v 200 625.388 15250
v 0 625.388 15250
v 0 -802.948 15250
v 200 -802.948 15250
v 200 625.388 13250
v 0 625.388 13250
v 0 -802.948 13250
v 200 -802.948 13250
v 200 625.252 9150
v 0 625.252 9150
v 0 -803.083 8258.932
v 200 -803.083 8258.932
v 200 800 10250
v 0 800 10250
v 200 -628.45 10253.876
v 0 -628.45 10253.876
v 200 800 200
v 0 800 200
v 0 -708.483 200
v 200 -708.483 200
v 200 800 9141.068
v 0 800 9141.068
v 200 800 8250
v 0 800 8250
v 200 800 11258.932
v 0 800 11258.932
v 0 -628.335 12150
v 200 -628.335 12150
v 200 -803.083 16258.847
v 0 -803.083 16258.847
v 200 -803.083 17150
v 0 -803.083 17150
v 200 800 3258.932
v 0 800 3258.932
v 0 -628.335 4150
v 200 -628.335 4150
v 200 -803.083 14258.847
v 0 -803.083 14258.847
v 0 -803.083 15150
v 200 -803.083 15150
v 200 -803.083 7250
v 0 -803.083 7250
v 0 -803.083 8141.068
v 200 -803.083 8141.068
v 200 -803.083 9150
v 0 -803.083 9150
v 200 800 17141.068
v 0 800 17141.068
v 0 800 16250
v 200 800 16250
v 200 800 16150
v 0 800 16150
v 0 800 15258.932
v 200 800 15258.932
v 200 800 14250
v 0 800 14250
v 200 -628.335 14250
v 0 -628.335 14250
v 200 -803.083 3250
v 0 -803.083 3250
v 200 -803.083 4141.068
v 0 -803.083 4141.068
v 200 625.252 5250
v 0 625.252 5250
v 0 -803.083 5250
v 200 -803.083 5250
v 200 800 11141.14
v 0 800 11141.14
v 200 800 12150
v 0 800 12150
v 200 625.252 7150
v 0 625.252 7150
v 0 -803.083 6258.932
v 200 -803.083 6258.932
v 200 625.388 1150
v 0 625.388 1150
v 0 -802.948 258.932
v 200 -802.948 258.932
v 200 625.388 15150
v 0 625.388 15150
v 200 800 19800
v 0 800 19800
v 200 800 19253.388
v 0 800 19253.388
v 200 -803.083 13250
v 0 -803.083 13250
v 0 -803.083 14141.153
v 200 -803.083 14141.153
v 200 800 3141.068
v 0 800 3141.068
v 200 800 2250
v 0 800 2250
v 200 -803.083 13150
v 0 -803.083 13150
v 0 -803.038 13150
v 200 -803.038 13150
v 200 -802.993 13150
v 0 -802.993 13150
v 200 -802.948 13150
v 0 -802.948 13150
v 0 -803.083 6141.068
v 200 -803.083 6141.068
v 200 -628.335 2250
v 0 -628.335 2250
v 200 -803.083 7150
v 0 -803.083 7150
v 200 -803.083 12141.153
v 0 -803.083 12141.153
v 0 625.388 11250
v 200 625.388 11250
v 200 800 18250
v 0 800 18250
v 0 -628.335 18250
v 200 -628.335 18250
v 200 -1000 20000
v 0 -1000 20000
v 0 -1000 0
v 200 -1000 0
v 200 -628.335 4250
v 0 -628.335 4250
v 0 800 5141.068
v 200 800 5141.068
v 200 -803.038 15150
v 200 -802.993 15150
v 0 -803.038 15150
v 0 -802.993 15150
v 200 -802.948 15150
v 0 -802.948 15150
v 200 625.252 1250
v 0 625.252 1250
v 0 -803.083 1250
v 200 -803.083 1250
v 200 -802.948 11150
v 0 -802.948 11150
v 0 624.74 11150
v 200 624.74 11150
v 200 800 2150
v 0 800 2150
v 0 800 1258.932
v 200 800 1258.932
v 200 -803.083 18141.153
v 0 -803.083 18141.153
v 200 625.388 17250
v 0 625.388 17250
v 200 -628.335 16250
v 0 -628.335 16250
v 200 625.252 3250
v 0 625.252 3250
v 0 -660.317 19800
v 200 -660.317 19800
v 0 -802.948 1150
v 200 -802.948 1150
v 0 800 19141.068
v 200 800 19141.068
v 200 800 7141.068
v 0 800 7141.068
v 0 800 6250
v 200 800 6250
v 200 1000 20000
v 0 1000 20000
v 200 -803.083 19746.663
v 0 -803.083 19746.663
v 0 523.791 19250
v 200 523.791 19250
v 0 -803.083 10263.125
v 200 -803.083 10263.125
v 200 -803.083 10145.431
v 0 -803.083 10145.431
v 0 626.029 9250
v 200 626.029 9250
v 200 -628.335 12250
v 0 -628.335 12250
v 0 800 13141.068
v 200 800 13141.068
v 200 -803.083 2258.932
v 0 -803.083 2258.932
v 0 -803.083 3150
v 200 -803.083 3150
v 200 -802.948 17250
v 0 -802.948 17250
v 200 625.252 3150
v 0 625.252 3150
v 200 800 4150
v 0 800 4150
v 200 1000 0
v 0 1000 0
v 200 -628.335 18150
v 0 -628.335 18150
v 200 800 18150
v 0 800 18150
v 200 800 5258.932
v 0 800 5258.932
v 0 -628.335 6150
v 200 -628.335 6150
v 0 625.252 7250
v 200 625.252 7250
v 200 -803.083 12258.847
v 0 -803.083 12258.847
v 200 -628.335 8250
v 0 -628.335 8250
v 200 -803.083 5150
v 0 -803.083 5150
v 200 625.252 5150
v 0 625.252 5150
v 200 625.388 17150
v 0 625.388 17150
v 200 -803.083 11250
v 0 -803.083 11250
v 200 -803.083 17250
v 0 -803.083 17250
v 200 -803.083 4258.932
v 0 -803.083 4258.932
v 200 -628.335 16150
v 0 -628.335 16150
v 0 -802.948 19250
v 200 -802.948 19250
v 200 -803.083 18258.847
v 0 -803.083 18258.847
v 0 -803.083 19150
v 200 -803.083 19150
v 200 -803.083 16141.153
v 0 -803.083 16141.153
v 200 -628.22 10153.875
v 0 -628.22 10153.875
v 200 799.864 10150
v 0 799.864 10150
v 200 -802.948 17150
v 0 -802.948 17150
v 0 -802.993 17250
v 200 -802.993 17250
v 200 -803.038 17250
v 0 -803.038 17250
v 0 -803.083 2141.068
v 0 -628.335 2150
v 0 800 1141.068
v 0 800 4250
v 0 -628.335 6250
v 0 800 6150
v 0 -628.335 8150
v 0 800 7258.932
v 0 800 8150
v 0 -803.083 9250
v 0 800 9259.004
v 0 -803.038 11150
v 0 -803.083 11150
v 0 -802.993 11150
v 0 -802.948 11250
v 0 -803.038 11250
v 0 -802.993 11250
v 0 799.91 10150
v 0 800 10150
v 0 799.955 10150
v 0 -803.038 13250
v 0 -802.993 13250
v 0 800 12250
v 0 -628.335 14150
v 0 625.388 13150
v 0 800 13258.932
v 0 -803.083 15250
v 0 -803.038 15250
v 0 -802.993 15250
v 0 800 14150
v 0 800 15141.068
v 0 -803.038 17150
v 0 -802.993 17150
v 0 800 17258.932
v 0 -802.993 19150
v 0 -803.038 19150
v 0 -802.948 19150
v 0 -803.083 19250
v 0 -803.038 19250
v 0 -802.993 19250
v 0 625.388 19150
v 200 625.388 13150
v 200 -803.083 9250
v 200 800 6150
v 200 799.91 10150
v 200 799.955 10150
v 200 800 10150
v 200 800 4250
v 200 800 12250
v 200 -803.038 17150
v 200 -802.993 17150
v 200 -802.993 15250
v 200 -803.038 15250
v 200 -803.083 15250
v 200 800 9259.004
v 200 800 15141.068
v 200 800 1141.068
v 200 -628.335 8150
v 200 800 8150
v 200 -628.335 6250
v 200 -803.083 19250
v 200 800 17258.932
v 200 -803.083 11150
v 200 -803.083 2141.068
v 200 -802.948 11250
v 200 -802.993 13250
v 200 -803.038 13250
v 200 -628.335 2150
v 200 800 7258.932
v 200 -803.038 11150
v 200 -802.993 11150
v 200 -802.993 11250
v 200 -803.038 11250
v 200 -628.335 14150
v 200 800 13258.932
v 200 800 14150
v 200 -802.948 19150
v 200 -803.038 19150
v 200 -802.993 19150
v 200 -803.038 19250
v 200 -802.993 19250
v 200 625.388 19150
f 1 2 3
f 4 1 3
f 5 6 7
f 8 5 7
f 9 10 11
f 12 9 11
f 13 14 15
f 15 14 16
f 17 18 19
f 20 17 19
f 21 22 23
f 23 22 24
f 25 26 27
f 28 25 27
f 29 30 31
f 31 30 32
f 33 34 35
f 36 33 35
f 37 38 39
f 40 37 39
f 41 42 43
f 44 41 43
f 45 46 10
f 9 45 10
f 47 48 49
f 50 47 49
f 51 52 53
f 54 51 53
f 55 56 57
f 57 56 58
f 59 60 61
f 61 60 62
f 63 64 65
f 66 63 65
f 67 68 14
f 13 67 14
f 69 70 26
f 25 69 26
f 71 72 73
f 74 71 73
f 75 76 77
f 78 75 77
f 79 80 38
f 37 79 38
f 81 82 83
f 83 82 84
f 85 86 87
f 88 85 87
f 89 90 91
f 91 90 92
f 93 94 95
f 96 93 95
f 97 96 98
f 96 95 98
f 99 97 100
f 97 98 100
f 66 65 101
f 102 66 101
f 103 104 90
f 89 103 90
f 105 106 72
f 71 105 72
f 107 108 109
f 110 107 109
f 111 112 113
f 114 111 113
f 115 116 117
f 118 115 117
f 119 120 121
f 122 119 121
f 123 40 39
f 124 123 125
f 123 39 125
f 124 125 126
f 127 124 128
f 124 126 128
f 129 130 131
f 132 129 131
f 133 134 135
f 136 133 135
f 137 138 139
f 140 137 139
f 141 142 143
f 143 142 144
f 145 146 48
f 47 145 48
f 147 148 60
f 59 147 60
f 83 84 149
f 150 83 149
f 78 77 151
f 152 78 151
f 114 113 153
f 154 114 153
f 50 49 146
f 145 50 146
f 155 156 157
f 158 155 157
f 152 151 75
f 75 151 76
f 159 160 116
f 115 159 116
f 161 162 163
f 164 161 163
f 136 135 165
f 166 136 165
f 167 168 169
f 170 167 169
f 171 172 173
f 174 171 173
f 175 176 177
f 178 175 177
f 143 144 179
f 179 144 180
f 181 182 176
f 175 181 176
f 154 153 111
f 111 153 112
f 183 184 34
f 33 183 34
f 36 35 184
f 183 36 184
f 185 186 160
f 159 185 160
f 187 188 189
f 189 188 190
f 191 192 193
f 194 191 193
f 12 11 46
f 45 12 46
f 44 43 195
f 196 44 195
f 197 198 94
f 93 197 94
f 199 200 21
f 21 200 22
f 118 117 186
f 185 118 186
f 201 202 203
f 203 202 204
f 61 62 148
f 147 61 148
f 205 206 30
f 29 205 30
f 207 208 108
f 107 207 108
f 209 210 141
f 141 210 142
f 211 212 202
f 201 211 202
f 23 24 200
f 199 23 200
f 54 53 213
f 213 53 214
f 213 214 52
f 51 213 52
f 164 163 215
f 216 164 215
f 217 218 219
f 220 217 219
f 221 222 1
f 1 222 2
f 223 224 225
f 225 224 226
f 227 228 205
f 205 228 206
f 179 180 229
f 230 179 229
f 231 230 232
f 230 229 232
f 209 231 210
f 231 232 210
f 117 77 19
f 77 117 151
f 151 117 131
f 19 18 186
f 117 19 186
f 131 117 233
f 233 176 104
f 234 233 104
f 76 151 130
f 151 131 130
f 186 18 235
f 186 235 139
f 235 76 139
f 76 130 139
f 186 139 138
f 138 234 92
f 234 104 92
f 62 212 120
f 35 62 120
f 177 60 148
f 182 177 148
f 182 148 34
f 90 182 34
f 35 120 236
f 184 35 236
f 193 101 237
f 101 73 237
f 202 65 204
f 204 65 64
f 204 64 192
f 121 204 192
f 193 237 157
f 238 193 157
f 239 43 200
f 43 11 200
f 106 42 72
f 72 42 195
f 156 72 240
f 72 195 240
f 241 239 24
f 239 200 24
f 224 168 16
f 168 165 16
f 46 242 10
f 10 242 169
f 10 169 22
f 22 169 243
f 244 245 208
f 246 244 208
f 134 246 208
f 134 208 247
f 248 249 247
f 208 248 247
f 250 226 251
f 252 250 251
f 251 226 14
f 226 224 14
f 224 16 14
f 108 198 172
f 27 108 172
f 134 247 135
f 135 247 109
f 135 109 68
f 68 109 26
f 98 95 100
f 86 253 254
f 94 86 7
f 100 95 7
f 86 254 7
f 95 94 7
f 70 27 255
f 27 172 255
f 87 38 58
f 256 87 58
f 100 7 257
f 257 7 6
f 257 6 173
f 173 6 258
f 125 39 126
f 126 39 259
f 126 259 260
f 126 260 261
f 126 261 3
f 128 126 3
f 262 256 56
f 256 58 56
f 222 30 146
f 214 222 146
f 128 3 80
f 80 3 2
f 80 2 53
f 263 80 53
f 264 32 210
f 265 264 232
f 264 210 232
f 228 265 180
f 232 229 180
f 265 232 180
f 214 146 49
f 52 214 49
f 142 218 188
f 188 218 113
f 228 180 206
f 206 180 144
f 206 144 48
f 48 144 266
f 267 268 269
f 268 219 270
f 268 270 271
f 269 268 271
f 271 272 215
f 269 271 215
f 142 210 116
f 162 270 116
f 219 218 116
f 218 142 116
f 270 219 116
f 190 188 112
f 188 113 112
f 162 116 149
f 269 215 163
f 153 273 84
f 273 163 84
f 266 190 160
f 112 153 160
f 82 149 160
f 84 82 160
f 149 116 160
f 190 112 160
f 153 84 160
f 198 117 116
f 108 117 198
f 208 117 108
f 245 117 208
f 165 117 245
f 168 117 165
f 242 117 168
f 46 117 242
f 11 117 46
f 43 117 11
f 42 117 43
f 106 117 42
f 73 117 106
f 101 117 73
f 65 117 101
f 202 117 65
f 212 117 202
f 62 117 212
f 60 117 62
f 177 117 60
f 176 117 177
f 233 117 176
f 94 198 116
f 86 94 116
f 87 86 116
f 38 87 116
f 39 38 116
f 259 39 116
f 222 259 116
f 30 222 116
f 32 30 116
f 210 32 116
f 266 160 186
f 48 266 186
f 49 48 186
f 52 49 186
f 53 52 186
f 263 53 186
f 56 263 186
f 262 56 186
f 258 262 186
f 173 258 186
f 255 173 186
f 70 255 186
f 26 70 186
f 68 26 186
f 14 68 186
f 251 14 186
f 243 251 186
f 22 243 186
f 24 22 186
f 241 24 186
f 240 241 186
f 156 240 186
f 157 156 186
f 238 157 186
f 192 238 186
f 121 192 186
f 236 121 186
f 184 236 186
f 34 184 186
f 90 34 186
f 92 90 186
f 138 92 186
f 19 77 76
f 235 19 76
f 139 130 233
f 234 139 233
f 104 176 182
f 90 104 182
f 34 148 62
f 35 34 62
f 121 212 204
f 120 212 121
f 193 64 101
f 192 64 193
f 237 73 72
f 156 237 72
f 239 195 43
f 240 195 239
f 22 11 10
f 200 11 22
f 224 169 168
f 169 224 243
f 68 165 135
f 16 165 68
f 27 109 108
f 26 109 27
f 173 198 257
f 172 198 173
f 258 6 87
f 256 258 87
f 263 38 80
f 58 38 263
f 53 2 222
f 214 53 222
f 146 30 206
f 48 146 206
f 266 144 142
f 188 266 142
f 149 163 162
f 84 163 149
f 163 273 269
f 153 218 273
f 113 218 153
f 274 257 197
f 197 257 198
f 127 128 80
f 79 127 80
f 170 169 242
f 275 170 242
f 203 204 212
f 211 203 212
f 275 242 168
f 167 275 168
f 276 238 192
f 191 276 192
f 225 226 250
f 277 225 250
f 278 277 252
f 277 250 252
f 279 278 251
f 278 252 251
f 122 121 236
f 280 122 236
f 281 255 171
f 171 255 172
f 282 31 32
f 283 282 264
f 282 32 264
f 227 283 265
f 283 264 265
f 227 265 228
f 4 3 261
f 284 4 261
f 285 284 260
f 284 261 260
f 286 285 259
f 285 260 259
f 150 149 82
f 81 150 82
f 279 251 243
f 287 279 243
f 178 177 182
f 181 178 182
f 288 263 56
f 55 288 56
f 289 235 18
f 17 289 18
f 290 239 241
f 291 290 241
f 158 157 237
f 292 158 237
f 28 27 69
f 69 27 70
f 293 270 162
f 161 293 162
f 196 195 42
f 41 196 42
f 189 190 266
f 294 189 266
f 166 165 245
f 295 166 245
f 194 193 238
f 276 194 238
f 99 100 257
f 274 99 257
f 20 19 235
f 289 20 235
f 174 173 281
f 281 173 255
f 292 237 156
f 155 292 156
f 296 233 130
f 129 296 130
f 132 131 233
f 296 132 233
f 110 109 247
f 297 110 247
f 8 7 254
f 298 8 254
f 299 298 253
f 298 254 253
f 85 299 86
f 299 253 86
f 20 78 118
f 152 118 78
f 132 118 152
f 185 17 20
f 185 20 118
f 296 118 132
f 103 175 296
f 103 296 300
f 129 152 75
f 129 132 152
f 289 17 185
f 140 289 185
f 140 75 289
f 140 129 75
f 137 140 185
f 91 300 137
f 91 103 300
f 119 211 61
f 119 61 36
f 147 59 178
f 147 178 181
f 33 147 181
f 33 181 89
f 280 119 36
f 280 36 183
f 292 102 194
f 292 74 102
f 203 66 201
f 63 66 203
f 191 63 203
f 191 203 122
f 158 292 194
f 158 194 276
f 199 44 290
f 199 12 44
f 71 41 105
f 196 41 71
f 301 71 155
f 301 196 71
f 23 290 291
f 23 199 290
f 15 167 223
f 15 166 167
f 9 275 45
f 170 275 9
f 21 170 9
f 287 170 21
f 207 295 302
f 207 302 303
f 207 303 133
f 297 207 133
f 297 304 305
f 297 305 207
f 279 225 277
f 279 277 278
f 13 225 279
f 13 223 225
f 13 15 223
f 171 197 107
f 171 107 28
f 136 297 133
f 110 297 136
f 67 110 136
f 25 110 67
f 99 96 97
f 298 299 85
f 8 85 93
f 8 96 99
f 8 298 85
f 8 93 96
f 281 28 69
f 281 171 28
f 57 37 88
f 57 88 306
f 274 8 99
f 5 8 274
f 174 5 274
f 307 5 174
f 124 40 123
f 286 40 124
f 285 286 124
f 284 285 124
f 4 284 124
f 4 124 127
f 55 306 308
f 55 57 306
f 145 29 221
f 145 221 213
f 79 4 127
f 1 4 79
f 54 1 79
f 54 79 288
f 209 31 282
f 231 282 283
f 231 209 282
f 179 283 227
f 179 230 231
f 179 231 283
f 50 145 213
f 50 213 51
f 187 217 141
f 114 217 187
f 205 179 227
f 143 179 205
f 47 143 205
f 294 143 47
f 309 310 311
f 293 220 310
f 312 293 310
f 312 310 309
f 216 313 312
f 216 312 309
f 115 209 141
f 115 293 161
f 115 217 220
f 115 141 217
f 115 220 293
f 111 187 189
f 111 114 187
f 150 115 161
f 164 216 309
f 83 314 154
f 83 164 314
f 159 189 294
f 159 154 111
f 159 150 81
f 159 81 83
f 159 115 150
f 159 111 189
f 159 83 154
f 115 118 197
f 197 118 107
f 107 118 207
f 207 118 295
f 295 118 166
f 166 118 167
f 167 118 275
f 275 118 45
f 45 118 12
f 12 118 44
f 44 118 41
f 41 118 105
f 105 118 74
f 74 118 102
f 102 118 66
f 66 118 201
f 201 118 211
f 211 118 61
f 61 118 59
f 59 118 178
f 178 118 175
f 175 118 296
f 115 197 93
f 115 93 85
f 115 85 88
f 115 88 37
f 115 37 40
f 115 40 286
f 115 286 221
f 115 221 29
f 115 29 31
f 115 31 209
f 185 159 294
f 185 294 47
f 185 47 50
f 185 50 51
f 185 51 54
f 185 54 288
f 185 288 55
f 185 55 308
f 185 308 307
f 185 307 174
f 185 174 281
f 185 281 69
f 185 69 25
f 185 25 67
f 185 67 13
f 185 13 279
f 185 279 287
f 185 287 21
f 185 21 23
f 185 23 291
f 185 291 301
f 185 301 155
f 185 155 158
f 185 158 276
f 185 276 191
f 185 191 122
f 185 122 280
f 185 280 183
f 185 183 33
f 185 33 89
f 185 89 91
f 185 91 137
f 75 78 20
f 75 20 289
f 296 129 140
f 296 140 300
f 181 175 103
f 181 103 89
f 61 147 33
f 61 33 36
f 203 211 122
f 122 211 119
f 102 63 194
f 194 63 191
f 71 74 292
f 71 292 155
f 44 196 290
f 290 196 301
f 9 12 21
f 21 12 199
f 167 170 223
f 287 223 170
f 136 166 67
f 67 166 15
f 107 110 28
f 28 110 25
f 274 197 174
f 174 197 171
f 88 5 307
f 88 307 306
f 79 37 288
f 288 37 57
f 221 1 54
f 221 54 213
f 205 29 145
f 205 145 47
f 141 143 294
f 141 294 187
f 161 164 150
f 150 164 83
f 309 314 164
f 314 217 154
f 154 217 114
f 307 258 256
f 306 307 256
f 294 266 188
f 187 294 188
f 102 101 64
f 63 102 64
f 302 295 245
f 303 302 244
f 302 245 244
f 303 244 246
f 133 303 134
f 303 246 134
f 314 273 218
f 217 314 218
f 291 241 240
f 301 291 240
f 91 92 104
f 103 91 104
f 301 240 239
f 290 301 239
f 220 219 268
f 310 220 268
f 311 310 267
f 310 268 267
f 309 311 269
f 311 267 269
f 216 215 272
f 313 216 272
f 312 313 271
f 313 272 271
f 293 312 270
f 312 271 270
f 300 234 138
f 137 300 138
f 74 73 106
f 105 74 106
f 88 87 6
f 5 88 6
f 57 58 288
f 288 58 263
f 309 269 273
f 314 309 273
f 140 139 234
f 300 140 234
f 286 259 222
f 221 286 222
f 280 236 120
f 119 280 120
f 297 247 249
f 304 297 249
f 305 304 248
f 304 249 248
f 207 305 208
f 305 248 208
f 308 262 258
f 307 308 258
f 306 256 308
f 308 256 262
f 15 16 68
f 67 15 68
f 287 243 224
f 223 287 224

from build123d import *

# Parameters (mm, degrees)
F0_W     = 200
F0_H     = 200
F1_DEPTH = 200


with BuildPart() as f1:
    # F0 (on Right) → F1 (new body)
    with BuildSketch(Plane.YZ):
        Polygon((-800, 0), (0, 0), (800, 0), (800, 200), (1000, 200), (1000, 20000), (-803.0831932057, 20000), (-1000, 20000), (-1000, 19800), (-1000, 0), align=None)
        Polygon((-802.9475212097, 1150), (625.3878056769, 1150), (-802.9475212097, 258.9319469369), align=None, mode=Mode.SUBTRACT)
        Polygon((-803.0831932057, 2141.0684212425), (625.252133681, 1250.0003681794), (-803.0831932057, 1250.0003681794), align=None, mode=Mode.SUBTRACT)
        Polygon((625.252133681, 3150.0003681793), (-803.0831932057, 2258.9323151163), (-803.0831932057, 3150.0003681795), align=None, mode=Mode.SUBTRACT)
        Polygon((-803.0831932057, 4141.0684212424), (625.2521336808, 3250.0003681795), (-803.0831932057, 3250.0003681793), align=None, mode=Mode.SUBTRACT)
        Polygon((625.2521336809, 5150.0003681793), (-803.0831932057, 4258.9323151163), (-803.0831932057, 5150.0003681793), align=None, mode=Mode.SUBTRACT)
        Polygon((625.252133681, 5250.0003681794), (-803.0831932057, 5250.0003681794), (-803.0831932057, 6141.0684212425), align=None, mode=Mode.SUBTRACT)
        Polygon((-803.0831932057, 7150.0003681793), (625.252133681, 7150.0003681794), (-803.0831932057, 6258.9323151163), align=None, mode=Mode.SUBTRACT)
        Polygon((-803.0831932057, 8141.0684212425), (625.252133681, 7250.0003681793), (-803.0831932057, 7250.0003681792), align=None, mode=Mode.SUBTRACT)
        Polygon((625.252133705, 9150.0003681404), (-803.0831932057, 8258.9323151163), (-803.0831932057, 9150.0003681414), align=None, mode=Mode.SUBTRACT)
        Polygon((-803.0831932057, 10145.4306546926), (626.0292053024, 9249.9999999981), (-803.0831932057, 9250.0000000154), align=None, mode=Mode.SUBTRACT)
        Polygon((800, 1141.0680530631), (800, 200), (-708.4827029471, 200), align=None, mode=Mode.SUBTRACT)
        Polygon((800, 2150), (800, 1258.9319469369), (-628.3353268867, 2150), align=None, mode=Mode.SUBTRACT)
        Polygon((800, 3141.0680530631), (800, 2250.0000000003), (-628.3353268868, 2250.0000000002), align=None, mode=Mode.SUBTRACT)
        Polygon((800, 4150), (800, 3258.9319469369), (-628.3353268867, 4150), align=None, mode=Mode.SUBTRACT)
        Polygon((800, 5141.0680530631), (800, 4250), (-628.3353268867, 4250), align=None, mode=Mode.SUBTRACT)
        Polygon((800, 6150), (800, 5258.9319469369), (-628.3353268867, 6150), align=None, mode=Mode.SUBTRACT)
        Polygon((800, 7141.0680530631), (800, 6250.0000000007), (-628.3353268871, 6250.0000000007), align=None, mode=Mode.SUBTRACT)
        Polygon((800, 8150), (800, 7258.9319469369), (-628.3353268867, 8150), align=None, mode=Mode.SUBTRACT)
        Polygon((800, 9141.0680530631), (800, 8250.0000000003), (-628.3353268868, 8250.0000000003), align=None, mode=Mode.SUBTRACT)
        with BuildLine():
            Line((800, 10149.9999999992), (800, 9259.0038703129))
            Line((800, 9259.0038703129), (-628.2197423898, 10153.8752186742))
            Line((-628.2197423898, 10153.8752186742), (799.8643280035, 10150.0001840684))
            ThreePointArc((799.8643280035, 10150.0001840684), (799.9321639393, 10150.0000460165), (800, 10149.9999999992))
        make_face(mode=Mode.SUBTRACT)
        Polygon((705.5469825314, 9200.0923691318), (705.6938166383, 9200.0003681383), (705.399509767, 9200.0003681383), align=None, mode=Mode.SUBTRACT)
        Polygon((-708.3674135023, 10204.0928794358), (-708.5976319881, 10204.0935041221), (-708.4825227452, 10204.1650027655), align=None, mode=Mode.SUBTRACT)
        with BuildLine():
            ThreePointArc((-803.0831932057, 11150.0001840603), (-803.0153572699, 11150.0000460084), (-802.9475212092, 11149.999999991))
            Line((-802.9475212092, 11149.999999991), (624.7404401391, 11149.9999999987))
            Line((624.7404401391, 11149.9999999987), (-803.0831932057, 10263.1254952541))
            Line((-803.0831932057, 10263.1254952541), (-803.0831932057, 11150.0001840603))
        make_face(mode=Mode.SUBTRACT)
        with BuildLine():
            ThreePointArc((-802.9475212092, 11250.0000000073), (-803.0153572699, 11249.99995399), (-803.0831932057, 11249.9998159381))
            Line((-803.0831932057, 11249.9998159381), (-803.0831932057, 12141.1526921379))
            Line((-803.0831932057, 12141.1526921379), (625.3878056754, 11250.0000000005))
            Line((625.3878056754, 11250.0000000005), (-802.9475212092, 11250.0000000073))
        make_face(mode=Mode.SUBTRACT)
        with BuildLine():
            ThreePointArc((-803.0831932057, 13150.0001840684), (-803.0153572699, 13150.0000460165), (-802.9475212092, 13149.9999999992))
            Line((-802.9475212092, 13149.9999999992), (625.3878056775, 13149.9999999992))
            Line((625.3878056775, 13149.9999999992), (-803.0831932057, 12258.8473078604))
            Line((-803.0831932057, 12258.8473078604), (-803.0831932057, 13150.0001840684))
        make_face(mode=Mode.SUBTRACT)
        with BuildLine():
            ThreePointArc((-802.9475212092, 13249.9999999992), (-803.0153572699, 13249.9999539818), (-803.0831932057, 13249.9998159299))
            Line((-803.0831932057, 13249.9998159299), (-803.0831932057, 14141.1526921379))
            Line((-803.0831932057, 14141.1526921379), (625.3878056779, 13249.9999999998))
            Line((625.3878056779, 13249.9999999998), (-802.9475212092, 13249.9999999992))
        make_face(mode=Mode.SUBTRACT)
        with BuildLine():
            ThreePointArc((-803.0831932057, 15150.0001840692), (-803.0153572701, 15150.0000460173), (-802.9475212097, 15150))
            Line((-802.9475212097, 15150), (625.387805677, 15150))
            Line((625.387805677, 15150), (-803.0831932057, 14258.8473078604))
            Line((-803.0831932057, 14258.8473078604), (-803.0831932057, 15150.0001840692))
        make_face(mode=Mode.SUBTRACT)
        with BuildLine():
            ThreePointArc((-802.9475212097, 15250), (-803.0153572701, 15249.9999539827), (-803.0831932057, 15249.9998159308))
            Line((-803.0831932057, 15249.9998159308), (-803.0831932057, 16141.1526921384))
            Line((-803.0831932057, 16141.1526921384), (625.3878056772, 15250.0000000005))
            Line((625.3878056771, 15250.0000000005), (-802.9475212097, 15250))
        make_face(mode=Mode.SUBTRACT)
        with BuildLine():
            ThreePointArc((-803.0831932057, 17150.0001840692), (-803.0153572701, 17150.0000460173), (-802.9475212097, 17150))
            Line((-802.9475212097, 17150), (625.3878056769, 17150))
            Line((625.3878056769, 17150), (-803.0831932057, 16258.8473078616))
            Line((-803.0831932057, 16258.8473078616), (-803.0831932057, 17150.0001840692))
        make_face(mode=Mode.SUBTRACT)
        with BuildLine():
            ThreePointArc((-802.9475212097, 17250), (-803.0153572701, 17249.9999539827), (-803.0831932057, 17249.9998159308))
            Line((-803.0831932057, 17249.9998159308), (-803.0831932057, 18141.1526921384))
            Line((-803.0831932057, 18141.1526921384), (625.387805677, 17250))
            Line((625.3878056769, 17250), (-802.9475212097, 17250))
        make_face(mode=Mode.SUBTRACT)
        with BuildLine():
            ThreePointArc((-803.0831932057, 19150.0001840692), (-803.0153572702, 19150.0000460173), (-802.9475212098, 19150))
            Line((-802.9475212098, 19150), (625.3878056769, 19150))
            Line((625.3878056769, 19150), (-803.0831932057, 18258.8473078617))
            Line((-803.0831932057, 18258.8473078617), (-803.0831932057, 19150.0001840692))
        make_face(mode=Mode.SUBTRACT)
        with BuildLine():
            ThreePointArc((-802.9475212098, 19250), (-803.0153572702, 19249.9999539827), (-803.0831932057, 19249.9998159308))
            Line((-803.0831932057, 19249.9998159308), (-803.0831932057, 19746.6628562227))
            Line((-803.0831932057, 19746.6628562227), (523.7909638927, 19250))
            Line((523.7909638927, 19250), (-802.9475212098, 19250))
        make_face(mode=Mode.SUBTRACT)
        Polygon((800, 11141.1397516309), (800, 10250.0001840699), (-628.4499608737, 10253.8762115003), align=None, mode=Mode.SUBTRACT)
        Polygon((800, 12149.9999999992), (800, 11258.9319469369), (-628.3353268861, 12149.9999999992), align=None, mode=Mode.SUBTRACT)
        Polygon((800, 13141.0680530631), (800, 12249.9999999992), (-628.3353268861, 12249.9999999992), align=None, mode=Mode.SUBTRACT)
        Polygon((800, 14149.9999999991), (800, 13258.9319469367), (-628.3353268861, 14149.9999999992), align=None, mode=Mode.SUBTRACT)
        Polygon((800, 15141.0680530631), (800, 14249.9999999973), (-628.3353268861, 14249.999999999), align=None, mode=Mode.SUBTRACT)
        Polygon((705.3868855449, 11200.0925146892), (705.535181738, 11199.9999999992), (705.2379415172, 11199.9999999992), align=None, mode=Mode.SUBTRACT)
        Polygon((800, 16150), (800, 15258.9319469367), (-628.3353268867, 16150), align=None, mode=Mode.SUBTRACT)
        Polygon((800, 17141.0680530631), (800, 16250), (-628.3353268867, 16250), align=None, mode=Mode.SUBTRACT)
        Polygon((800, 18150), (800, 17258.9319469369), (-628.3353268866, 18150), align=None, mode=Mode.SUBTRACT)
        Polygon((800, 19141.0680530631), (800, 18249.9999999992), (-628.3353268867, 18250), align=None, mode=Mode.SUBTRACT)
        Polygon((800, 19800), (800, 19253.3879272225), (-660.3174452032, 19800), align=None, mode=Mode.SUBTRACT)
        with Locations((900, 100)):
            Rectangle(F0_W, F0_H)
        Polygon((705.2379415172, 11199.9999999992), (705.535181738, 11199.9999999992), (705.3868855449, 11200.0925146892), align=None)
        Polygon((705.399509767, 9200.0003681383), (705.6938166383, 9200.0003681383), (705.5469825314, 9200.0923691318), align=None)
        Polygon((-708.4825227452, 10204.1650027655), (-708.5976319881, 10204.0935041221), (-708.3674135023, 10204.0928794358), align=None)
    extrude(amount=F1_DEPTH)


solid = f1.part
